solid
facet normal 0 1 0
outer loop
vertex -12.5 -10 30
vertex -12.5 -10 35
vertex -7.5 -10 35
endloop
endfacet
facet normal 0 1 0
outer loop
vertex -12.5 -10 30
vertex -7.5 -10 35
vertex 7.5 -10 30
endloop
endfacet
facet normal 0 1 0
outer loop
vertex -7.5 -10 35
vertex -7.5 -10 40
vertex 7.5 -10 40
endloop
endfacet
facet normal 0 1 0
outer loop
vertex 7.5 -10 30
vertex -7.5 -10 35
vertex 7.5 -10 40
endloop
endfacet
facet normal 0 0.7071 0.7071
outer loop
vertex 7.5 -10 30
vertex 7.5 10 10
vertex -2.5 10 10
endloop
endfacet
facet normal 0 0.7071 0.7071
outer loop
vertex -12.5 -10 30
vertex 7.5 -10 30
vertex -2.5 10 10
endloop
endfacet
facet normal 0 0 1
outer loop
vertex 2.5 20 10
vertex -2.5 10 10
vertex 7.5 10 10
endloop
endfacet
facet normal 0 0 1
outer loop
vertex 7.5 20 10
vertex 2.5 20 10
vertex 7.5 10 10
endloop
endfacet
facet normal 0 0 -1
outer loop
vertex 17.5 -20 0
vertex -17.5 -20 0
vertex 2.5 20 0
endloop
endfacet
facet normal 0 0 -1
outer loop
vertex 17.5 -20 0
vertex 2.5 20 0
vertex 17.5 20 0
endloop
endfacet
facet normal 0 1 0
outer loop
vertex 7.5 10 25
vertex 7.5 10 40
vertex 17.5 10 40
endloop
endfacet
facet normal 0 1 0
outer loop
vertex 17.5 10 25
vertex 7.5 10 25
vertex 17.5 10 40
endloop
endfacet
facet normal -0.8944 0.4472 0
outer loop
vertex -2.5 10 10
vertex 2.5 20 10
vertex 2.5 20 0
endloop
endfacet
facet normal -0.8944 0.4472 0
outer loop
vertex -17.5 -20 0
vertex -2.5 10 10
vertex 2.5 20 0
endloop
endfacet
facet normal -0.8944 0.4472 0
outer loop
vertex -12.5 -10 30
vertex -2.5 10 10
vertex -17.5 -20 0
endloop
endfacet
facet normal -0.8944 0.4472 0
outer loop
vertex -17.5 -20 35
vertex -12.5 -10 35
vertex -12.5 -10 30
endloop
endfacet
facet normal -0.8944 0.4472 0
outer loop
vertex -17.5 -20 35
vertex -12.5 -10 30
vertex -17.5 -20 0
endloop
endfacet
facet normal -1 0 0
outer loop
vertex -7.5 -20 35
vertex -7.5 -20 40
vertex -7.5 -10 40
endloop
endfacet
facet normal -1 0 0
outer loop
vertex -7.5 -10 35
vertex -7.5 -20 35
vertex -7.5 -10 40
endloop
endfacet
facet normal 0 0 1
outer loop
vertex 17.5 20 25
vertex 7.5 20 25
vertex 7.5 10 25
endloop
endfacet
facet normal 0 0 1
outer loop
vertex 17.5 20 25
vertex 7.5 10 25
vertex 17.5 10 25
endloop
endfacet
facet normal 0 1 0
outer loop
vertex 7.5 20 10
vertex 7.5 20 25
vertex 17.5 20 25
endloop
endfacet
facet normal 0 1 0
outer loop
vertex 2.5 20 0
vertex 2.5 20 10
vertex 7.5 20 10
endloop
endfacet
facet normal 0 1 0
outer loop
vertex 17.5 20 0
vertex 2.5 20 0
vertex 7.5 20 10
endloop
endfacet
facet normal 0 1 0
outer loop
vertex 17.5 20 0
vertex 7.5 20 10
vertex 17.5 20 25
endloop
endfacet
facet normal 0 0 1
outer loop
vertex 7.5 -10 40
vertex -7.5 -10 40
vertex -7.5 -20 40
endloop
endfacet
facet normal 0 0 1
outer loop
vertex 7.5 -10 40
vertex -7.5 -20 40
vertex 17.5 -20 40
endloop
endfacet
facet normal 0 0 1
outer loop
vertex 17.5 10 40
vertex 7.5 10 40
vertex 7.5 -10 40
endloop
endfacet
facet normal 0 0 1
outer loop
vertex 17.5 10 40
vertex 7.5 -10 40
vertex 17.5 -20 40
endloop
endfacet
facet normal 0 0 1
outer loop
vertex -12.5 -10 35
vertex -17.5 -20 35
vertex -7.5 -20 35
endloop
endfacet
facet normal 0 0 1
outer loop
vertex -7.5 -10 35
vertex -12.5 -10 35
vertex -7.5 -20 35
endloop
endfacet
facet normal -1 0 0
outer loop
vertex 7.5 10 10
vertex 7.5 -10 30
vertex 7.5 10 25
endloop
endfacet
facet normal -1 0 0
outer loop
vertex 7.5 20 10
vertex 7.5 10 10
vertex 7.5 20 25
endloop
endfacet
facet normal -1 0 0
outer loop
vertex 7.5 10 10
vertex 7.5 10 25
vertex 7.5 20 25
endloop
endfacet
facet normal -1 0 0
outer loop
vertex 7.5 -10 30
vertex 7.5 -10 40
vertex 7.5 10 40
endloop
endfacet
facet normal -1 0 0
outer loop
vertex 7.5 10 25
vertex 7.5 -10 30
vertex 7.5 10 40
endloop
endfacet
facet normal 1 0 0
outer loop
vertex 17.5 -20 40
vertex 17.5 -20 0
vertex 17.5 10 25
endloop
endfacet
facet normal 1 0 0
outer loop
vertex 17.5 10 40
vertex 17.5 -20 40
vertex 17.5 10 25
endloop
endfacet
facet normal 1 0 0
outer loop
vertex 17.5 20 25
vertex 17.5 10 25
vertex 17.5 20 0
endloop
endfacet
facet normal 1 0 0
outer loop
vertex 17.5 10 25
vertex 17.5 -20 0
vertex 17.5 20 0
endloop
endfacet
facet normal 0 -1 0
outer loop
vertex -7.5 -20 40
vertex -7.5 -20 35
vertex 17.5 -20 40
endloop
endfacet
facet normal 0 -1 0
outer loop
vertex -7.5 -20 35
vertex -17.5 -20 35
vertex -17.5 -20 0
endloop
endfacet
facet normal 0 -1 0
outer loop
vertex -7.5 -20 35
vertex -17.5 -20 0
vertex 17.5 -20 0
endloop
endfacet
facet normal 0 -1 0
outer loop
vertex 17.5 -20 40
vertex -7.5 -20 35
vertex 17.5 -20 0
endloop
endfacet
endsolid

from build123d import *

# Parameters (mm, degrees)
SKETCH1_W           = 35
SKETCH1_H           = 40
BOSS_EXTRUDE1_DEPTH = 40
SKETCH2_W           = 10
SKETCH2_H           = 10
CUT_EXTRUDE1_DEPTH  = 15
SKETCH3_W           = 10
SKETCH3_H           = 10
CUT_EXTRUDE2_DEPTH  = 5
SKETCH4_W           = 25
SKETCH4_H           = 30
CUT_EXTRUDE3_DEPTH  = 10
CUT_EXTRUDE4_DEPTH  = 31
CUT_EXTRUDE5_DEPTH  = 10
CUT_EXTRUDE6_DEPTH  = 20
CUT_EXTRUDE7_DEPTH  = 20


with BuildPart() as part:
    # Sketch1 → Boss-Extrude1 (new body)
    with BuildSketch(Plane.XY):
        Rectangle(SKETCH1_W, SKETCH1_H)
    extrude(amount=BOSS_EXTRUDE1_DEPTH)

    # Sketch2 → Cut-Extrude1 (cut)
    with BuildSketch(Plane.XY.offset(40)):
        with Locations((12.5, 15)):
            Rectangle(SKETCH2_W, SKETCH2_H)
    extrude(amount=-CUT_EXTRUDE1_DEPTH, mode=Mode.SUBTRACT)

    # Sketch3 → Cut-Extrude2 (cut)
    with BuildSketch(Plane.XY.offset(40)):
        with Locations((-12.5, -15)):
            Rectangle(SKETCH3_W, SKETCH3_H)
    extrude(amount=-CUT_EXTRUDE2_DEPTH, mode=Mode.SUBTRACT)

    # Sketch4 → Cut-Extrude3 (cut)
    with BuildSketch(Plane.XY.offset(40)):
        with Locations((-5, 5)):
            Rectangle(SKETCH4_W, SKETCH4_H)
    extrude(amount=-CUT_EXTRUDE3_DEPTH, mode=Mode.SUBTRACT)

    # Sketch5 → Cut-Extrude4 (cut, through all)
    with BuildSketch(Plane.XY.offset(30)):
        Polygon((2.5, 20), (-17.5, -20), (-17.5, 20), align=None)
    extrude(amount=-CUT_EXTRUDE4_DEPTH, mode=Mode.SUBTRACT)

    # Sketch6 → Cut-Extrude5 (cut)
    with BuildSketch(Plane.XY.offset(35)):
        Polygon((-12.5, -10), (-17.5, -20), (-17.5, -10), align=None)
    extrude(amount=-CUT_EXTRUDE5_DEPTH, mode=Mode.SUBTRACT)

    # Sketch7 → Cut-Extrude6 (cut)
    with BuildSketch(Plane.XY.offset(30)):
        Polygon((7.5, 20), (2.5, 20), (-2.5, 10), (7.5, 10), align=None)
    extrude(amount=-CUT_EXTRUDE6_DEPTH, mode=Mode.SUBTRACT)

    # Sketch13 → Cut-Extrude7 (cut)
    with BuildSketch(Plane(origin=(0, 10, 10), x_dir=(1, 0, 0), z_dir=(0, 0.707106781, 0.707106781))):
        Polygon((7.5, 0), (7.5, -28.284271247), (-12.5, -28.284271247), (-2.5, 0), align=None)
    extrude(amount=CUT_EXTRUDE7_DEPTH, mode=Mode.SUBTRACT)


solid = part.part
